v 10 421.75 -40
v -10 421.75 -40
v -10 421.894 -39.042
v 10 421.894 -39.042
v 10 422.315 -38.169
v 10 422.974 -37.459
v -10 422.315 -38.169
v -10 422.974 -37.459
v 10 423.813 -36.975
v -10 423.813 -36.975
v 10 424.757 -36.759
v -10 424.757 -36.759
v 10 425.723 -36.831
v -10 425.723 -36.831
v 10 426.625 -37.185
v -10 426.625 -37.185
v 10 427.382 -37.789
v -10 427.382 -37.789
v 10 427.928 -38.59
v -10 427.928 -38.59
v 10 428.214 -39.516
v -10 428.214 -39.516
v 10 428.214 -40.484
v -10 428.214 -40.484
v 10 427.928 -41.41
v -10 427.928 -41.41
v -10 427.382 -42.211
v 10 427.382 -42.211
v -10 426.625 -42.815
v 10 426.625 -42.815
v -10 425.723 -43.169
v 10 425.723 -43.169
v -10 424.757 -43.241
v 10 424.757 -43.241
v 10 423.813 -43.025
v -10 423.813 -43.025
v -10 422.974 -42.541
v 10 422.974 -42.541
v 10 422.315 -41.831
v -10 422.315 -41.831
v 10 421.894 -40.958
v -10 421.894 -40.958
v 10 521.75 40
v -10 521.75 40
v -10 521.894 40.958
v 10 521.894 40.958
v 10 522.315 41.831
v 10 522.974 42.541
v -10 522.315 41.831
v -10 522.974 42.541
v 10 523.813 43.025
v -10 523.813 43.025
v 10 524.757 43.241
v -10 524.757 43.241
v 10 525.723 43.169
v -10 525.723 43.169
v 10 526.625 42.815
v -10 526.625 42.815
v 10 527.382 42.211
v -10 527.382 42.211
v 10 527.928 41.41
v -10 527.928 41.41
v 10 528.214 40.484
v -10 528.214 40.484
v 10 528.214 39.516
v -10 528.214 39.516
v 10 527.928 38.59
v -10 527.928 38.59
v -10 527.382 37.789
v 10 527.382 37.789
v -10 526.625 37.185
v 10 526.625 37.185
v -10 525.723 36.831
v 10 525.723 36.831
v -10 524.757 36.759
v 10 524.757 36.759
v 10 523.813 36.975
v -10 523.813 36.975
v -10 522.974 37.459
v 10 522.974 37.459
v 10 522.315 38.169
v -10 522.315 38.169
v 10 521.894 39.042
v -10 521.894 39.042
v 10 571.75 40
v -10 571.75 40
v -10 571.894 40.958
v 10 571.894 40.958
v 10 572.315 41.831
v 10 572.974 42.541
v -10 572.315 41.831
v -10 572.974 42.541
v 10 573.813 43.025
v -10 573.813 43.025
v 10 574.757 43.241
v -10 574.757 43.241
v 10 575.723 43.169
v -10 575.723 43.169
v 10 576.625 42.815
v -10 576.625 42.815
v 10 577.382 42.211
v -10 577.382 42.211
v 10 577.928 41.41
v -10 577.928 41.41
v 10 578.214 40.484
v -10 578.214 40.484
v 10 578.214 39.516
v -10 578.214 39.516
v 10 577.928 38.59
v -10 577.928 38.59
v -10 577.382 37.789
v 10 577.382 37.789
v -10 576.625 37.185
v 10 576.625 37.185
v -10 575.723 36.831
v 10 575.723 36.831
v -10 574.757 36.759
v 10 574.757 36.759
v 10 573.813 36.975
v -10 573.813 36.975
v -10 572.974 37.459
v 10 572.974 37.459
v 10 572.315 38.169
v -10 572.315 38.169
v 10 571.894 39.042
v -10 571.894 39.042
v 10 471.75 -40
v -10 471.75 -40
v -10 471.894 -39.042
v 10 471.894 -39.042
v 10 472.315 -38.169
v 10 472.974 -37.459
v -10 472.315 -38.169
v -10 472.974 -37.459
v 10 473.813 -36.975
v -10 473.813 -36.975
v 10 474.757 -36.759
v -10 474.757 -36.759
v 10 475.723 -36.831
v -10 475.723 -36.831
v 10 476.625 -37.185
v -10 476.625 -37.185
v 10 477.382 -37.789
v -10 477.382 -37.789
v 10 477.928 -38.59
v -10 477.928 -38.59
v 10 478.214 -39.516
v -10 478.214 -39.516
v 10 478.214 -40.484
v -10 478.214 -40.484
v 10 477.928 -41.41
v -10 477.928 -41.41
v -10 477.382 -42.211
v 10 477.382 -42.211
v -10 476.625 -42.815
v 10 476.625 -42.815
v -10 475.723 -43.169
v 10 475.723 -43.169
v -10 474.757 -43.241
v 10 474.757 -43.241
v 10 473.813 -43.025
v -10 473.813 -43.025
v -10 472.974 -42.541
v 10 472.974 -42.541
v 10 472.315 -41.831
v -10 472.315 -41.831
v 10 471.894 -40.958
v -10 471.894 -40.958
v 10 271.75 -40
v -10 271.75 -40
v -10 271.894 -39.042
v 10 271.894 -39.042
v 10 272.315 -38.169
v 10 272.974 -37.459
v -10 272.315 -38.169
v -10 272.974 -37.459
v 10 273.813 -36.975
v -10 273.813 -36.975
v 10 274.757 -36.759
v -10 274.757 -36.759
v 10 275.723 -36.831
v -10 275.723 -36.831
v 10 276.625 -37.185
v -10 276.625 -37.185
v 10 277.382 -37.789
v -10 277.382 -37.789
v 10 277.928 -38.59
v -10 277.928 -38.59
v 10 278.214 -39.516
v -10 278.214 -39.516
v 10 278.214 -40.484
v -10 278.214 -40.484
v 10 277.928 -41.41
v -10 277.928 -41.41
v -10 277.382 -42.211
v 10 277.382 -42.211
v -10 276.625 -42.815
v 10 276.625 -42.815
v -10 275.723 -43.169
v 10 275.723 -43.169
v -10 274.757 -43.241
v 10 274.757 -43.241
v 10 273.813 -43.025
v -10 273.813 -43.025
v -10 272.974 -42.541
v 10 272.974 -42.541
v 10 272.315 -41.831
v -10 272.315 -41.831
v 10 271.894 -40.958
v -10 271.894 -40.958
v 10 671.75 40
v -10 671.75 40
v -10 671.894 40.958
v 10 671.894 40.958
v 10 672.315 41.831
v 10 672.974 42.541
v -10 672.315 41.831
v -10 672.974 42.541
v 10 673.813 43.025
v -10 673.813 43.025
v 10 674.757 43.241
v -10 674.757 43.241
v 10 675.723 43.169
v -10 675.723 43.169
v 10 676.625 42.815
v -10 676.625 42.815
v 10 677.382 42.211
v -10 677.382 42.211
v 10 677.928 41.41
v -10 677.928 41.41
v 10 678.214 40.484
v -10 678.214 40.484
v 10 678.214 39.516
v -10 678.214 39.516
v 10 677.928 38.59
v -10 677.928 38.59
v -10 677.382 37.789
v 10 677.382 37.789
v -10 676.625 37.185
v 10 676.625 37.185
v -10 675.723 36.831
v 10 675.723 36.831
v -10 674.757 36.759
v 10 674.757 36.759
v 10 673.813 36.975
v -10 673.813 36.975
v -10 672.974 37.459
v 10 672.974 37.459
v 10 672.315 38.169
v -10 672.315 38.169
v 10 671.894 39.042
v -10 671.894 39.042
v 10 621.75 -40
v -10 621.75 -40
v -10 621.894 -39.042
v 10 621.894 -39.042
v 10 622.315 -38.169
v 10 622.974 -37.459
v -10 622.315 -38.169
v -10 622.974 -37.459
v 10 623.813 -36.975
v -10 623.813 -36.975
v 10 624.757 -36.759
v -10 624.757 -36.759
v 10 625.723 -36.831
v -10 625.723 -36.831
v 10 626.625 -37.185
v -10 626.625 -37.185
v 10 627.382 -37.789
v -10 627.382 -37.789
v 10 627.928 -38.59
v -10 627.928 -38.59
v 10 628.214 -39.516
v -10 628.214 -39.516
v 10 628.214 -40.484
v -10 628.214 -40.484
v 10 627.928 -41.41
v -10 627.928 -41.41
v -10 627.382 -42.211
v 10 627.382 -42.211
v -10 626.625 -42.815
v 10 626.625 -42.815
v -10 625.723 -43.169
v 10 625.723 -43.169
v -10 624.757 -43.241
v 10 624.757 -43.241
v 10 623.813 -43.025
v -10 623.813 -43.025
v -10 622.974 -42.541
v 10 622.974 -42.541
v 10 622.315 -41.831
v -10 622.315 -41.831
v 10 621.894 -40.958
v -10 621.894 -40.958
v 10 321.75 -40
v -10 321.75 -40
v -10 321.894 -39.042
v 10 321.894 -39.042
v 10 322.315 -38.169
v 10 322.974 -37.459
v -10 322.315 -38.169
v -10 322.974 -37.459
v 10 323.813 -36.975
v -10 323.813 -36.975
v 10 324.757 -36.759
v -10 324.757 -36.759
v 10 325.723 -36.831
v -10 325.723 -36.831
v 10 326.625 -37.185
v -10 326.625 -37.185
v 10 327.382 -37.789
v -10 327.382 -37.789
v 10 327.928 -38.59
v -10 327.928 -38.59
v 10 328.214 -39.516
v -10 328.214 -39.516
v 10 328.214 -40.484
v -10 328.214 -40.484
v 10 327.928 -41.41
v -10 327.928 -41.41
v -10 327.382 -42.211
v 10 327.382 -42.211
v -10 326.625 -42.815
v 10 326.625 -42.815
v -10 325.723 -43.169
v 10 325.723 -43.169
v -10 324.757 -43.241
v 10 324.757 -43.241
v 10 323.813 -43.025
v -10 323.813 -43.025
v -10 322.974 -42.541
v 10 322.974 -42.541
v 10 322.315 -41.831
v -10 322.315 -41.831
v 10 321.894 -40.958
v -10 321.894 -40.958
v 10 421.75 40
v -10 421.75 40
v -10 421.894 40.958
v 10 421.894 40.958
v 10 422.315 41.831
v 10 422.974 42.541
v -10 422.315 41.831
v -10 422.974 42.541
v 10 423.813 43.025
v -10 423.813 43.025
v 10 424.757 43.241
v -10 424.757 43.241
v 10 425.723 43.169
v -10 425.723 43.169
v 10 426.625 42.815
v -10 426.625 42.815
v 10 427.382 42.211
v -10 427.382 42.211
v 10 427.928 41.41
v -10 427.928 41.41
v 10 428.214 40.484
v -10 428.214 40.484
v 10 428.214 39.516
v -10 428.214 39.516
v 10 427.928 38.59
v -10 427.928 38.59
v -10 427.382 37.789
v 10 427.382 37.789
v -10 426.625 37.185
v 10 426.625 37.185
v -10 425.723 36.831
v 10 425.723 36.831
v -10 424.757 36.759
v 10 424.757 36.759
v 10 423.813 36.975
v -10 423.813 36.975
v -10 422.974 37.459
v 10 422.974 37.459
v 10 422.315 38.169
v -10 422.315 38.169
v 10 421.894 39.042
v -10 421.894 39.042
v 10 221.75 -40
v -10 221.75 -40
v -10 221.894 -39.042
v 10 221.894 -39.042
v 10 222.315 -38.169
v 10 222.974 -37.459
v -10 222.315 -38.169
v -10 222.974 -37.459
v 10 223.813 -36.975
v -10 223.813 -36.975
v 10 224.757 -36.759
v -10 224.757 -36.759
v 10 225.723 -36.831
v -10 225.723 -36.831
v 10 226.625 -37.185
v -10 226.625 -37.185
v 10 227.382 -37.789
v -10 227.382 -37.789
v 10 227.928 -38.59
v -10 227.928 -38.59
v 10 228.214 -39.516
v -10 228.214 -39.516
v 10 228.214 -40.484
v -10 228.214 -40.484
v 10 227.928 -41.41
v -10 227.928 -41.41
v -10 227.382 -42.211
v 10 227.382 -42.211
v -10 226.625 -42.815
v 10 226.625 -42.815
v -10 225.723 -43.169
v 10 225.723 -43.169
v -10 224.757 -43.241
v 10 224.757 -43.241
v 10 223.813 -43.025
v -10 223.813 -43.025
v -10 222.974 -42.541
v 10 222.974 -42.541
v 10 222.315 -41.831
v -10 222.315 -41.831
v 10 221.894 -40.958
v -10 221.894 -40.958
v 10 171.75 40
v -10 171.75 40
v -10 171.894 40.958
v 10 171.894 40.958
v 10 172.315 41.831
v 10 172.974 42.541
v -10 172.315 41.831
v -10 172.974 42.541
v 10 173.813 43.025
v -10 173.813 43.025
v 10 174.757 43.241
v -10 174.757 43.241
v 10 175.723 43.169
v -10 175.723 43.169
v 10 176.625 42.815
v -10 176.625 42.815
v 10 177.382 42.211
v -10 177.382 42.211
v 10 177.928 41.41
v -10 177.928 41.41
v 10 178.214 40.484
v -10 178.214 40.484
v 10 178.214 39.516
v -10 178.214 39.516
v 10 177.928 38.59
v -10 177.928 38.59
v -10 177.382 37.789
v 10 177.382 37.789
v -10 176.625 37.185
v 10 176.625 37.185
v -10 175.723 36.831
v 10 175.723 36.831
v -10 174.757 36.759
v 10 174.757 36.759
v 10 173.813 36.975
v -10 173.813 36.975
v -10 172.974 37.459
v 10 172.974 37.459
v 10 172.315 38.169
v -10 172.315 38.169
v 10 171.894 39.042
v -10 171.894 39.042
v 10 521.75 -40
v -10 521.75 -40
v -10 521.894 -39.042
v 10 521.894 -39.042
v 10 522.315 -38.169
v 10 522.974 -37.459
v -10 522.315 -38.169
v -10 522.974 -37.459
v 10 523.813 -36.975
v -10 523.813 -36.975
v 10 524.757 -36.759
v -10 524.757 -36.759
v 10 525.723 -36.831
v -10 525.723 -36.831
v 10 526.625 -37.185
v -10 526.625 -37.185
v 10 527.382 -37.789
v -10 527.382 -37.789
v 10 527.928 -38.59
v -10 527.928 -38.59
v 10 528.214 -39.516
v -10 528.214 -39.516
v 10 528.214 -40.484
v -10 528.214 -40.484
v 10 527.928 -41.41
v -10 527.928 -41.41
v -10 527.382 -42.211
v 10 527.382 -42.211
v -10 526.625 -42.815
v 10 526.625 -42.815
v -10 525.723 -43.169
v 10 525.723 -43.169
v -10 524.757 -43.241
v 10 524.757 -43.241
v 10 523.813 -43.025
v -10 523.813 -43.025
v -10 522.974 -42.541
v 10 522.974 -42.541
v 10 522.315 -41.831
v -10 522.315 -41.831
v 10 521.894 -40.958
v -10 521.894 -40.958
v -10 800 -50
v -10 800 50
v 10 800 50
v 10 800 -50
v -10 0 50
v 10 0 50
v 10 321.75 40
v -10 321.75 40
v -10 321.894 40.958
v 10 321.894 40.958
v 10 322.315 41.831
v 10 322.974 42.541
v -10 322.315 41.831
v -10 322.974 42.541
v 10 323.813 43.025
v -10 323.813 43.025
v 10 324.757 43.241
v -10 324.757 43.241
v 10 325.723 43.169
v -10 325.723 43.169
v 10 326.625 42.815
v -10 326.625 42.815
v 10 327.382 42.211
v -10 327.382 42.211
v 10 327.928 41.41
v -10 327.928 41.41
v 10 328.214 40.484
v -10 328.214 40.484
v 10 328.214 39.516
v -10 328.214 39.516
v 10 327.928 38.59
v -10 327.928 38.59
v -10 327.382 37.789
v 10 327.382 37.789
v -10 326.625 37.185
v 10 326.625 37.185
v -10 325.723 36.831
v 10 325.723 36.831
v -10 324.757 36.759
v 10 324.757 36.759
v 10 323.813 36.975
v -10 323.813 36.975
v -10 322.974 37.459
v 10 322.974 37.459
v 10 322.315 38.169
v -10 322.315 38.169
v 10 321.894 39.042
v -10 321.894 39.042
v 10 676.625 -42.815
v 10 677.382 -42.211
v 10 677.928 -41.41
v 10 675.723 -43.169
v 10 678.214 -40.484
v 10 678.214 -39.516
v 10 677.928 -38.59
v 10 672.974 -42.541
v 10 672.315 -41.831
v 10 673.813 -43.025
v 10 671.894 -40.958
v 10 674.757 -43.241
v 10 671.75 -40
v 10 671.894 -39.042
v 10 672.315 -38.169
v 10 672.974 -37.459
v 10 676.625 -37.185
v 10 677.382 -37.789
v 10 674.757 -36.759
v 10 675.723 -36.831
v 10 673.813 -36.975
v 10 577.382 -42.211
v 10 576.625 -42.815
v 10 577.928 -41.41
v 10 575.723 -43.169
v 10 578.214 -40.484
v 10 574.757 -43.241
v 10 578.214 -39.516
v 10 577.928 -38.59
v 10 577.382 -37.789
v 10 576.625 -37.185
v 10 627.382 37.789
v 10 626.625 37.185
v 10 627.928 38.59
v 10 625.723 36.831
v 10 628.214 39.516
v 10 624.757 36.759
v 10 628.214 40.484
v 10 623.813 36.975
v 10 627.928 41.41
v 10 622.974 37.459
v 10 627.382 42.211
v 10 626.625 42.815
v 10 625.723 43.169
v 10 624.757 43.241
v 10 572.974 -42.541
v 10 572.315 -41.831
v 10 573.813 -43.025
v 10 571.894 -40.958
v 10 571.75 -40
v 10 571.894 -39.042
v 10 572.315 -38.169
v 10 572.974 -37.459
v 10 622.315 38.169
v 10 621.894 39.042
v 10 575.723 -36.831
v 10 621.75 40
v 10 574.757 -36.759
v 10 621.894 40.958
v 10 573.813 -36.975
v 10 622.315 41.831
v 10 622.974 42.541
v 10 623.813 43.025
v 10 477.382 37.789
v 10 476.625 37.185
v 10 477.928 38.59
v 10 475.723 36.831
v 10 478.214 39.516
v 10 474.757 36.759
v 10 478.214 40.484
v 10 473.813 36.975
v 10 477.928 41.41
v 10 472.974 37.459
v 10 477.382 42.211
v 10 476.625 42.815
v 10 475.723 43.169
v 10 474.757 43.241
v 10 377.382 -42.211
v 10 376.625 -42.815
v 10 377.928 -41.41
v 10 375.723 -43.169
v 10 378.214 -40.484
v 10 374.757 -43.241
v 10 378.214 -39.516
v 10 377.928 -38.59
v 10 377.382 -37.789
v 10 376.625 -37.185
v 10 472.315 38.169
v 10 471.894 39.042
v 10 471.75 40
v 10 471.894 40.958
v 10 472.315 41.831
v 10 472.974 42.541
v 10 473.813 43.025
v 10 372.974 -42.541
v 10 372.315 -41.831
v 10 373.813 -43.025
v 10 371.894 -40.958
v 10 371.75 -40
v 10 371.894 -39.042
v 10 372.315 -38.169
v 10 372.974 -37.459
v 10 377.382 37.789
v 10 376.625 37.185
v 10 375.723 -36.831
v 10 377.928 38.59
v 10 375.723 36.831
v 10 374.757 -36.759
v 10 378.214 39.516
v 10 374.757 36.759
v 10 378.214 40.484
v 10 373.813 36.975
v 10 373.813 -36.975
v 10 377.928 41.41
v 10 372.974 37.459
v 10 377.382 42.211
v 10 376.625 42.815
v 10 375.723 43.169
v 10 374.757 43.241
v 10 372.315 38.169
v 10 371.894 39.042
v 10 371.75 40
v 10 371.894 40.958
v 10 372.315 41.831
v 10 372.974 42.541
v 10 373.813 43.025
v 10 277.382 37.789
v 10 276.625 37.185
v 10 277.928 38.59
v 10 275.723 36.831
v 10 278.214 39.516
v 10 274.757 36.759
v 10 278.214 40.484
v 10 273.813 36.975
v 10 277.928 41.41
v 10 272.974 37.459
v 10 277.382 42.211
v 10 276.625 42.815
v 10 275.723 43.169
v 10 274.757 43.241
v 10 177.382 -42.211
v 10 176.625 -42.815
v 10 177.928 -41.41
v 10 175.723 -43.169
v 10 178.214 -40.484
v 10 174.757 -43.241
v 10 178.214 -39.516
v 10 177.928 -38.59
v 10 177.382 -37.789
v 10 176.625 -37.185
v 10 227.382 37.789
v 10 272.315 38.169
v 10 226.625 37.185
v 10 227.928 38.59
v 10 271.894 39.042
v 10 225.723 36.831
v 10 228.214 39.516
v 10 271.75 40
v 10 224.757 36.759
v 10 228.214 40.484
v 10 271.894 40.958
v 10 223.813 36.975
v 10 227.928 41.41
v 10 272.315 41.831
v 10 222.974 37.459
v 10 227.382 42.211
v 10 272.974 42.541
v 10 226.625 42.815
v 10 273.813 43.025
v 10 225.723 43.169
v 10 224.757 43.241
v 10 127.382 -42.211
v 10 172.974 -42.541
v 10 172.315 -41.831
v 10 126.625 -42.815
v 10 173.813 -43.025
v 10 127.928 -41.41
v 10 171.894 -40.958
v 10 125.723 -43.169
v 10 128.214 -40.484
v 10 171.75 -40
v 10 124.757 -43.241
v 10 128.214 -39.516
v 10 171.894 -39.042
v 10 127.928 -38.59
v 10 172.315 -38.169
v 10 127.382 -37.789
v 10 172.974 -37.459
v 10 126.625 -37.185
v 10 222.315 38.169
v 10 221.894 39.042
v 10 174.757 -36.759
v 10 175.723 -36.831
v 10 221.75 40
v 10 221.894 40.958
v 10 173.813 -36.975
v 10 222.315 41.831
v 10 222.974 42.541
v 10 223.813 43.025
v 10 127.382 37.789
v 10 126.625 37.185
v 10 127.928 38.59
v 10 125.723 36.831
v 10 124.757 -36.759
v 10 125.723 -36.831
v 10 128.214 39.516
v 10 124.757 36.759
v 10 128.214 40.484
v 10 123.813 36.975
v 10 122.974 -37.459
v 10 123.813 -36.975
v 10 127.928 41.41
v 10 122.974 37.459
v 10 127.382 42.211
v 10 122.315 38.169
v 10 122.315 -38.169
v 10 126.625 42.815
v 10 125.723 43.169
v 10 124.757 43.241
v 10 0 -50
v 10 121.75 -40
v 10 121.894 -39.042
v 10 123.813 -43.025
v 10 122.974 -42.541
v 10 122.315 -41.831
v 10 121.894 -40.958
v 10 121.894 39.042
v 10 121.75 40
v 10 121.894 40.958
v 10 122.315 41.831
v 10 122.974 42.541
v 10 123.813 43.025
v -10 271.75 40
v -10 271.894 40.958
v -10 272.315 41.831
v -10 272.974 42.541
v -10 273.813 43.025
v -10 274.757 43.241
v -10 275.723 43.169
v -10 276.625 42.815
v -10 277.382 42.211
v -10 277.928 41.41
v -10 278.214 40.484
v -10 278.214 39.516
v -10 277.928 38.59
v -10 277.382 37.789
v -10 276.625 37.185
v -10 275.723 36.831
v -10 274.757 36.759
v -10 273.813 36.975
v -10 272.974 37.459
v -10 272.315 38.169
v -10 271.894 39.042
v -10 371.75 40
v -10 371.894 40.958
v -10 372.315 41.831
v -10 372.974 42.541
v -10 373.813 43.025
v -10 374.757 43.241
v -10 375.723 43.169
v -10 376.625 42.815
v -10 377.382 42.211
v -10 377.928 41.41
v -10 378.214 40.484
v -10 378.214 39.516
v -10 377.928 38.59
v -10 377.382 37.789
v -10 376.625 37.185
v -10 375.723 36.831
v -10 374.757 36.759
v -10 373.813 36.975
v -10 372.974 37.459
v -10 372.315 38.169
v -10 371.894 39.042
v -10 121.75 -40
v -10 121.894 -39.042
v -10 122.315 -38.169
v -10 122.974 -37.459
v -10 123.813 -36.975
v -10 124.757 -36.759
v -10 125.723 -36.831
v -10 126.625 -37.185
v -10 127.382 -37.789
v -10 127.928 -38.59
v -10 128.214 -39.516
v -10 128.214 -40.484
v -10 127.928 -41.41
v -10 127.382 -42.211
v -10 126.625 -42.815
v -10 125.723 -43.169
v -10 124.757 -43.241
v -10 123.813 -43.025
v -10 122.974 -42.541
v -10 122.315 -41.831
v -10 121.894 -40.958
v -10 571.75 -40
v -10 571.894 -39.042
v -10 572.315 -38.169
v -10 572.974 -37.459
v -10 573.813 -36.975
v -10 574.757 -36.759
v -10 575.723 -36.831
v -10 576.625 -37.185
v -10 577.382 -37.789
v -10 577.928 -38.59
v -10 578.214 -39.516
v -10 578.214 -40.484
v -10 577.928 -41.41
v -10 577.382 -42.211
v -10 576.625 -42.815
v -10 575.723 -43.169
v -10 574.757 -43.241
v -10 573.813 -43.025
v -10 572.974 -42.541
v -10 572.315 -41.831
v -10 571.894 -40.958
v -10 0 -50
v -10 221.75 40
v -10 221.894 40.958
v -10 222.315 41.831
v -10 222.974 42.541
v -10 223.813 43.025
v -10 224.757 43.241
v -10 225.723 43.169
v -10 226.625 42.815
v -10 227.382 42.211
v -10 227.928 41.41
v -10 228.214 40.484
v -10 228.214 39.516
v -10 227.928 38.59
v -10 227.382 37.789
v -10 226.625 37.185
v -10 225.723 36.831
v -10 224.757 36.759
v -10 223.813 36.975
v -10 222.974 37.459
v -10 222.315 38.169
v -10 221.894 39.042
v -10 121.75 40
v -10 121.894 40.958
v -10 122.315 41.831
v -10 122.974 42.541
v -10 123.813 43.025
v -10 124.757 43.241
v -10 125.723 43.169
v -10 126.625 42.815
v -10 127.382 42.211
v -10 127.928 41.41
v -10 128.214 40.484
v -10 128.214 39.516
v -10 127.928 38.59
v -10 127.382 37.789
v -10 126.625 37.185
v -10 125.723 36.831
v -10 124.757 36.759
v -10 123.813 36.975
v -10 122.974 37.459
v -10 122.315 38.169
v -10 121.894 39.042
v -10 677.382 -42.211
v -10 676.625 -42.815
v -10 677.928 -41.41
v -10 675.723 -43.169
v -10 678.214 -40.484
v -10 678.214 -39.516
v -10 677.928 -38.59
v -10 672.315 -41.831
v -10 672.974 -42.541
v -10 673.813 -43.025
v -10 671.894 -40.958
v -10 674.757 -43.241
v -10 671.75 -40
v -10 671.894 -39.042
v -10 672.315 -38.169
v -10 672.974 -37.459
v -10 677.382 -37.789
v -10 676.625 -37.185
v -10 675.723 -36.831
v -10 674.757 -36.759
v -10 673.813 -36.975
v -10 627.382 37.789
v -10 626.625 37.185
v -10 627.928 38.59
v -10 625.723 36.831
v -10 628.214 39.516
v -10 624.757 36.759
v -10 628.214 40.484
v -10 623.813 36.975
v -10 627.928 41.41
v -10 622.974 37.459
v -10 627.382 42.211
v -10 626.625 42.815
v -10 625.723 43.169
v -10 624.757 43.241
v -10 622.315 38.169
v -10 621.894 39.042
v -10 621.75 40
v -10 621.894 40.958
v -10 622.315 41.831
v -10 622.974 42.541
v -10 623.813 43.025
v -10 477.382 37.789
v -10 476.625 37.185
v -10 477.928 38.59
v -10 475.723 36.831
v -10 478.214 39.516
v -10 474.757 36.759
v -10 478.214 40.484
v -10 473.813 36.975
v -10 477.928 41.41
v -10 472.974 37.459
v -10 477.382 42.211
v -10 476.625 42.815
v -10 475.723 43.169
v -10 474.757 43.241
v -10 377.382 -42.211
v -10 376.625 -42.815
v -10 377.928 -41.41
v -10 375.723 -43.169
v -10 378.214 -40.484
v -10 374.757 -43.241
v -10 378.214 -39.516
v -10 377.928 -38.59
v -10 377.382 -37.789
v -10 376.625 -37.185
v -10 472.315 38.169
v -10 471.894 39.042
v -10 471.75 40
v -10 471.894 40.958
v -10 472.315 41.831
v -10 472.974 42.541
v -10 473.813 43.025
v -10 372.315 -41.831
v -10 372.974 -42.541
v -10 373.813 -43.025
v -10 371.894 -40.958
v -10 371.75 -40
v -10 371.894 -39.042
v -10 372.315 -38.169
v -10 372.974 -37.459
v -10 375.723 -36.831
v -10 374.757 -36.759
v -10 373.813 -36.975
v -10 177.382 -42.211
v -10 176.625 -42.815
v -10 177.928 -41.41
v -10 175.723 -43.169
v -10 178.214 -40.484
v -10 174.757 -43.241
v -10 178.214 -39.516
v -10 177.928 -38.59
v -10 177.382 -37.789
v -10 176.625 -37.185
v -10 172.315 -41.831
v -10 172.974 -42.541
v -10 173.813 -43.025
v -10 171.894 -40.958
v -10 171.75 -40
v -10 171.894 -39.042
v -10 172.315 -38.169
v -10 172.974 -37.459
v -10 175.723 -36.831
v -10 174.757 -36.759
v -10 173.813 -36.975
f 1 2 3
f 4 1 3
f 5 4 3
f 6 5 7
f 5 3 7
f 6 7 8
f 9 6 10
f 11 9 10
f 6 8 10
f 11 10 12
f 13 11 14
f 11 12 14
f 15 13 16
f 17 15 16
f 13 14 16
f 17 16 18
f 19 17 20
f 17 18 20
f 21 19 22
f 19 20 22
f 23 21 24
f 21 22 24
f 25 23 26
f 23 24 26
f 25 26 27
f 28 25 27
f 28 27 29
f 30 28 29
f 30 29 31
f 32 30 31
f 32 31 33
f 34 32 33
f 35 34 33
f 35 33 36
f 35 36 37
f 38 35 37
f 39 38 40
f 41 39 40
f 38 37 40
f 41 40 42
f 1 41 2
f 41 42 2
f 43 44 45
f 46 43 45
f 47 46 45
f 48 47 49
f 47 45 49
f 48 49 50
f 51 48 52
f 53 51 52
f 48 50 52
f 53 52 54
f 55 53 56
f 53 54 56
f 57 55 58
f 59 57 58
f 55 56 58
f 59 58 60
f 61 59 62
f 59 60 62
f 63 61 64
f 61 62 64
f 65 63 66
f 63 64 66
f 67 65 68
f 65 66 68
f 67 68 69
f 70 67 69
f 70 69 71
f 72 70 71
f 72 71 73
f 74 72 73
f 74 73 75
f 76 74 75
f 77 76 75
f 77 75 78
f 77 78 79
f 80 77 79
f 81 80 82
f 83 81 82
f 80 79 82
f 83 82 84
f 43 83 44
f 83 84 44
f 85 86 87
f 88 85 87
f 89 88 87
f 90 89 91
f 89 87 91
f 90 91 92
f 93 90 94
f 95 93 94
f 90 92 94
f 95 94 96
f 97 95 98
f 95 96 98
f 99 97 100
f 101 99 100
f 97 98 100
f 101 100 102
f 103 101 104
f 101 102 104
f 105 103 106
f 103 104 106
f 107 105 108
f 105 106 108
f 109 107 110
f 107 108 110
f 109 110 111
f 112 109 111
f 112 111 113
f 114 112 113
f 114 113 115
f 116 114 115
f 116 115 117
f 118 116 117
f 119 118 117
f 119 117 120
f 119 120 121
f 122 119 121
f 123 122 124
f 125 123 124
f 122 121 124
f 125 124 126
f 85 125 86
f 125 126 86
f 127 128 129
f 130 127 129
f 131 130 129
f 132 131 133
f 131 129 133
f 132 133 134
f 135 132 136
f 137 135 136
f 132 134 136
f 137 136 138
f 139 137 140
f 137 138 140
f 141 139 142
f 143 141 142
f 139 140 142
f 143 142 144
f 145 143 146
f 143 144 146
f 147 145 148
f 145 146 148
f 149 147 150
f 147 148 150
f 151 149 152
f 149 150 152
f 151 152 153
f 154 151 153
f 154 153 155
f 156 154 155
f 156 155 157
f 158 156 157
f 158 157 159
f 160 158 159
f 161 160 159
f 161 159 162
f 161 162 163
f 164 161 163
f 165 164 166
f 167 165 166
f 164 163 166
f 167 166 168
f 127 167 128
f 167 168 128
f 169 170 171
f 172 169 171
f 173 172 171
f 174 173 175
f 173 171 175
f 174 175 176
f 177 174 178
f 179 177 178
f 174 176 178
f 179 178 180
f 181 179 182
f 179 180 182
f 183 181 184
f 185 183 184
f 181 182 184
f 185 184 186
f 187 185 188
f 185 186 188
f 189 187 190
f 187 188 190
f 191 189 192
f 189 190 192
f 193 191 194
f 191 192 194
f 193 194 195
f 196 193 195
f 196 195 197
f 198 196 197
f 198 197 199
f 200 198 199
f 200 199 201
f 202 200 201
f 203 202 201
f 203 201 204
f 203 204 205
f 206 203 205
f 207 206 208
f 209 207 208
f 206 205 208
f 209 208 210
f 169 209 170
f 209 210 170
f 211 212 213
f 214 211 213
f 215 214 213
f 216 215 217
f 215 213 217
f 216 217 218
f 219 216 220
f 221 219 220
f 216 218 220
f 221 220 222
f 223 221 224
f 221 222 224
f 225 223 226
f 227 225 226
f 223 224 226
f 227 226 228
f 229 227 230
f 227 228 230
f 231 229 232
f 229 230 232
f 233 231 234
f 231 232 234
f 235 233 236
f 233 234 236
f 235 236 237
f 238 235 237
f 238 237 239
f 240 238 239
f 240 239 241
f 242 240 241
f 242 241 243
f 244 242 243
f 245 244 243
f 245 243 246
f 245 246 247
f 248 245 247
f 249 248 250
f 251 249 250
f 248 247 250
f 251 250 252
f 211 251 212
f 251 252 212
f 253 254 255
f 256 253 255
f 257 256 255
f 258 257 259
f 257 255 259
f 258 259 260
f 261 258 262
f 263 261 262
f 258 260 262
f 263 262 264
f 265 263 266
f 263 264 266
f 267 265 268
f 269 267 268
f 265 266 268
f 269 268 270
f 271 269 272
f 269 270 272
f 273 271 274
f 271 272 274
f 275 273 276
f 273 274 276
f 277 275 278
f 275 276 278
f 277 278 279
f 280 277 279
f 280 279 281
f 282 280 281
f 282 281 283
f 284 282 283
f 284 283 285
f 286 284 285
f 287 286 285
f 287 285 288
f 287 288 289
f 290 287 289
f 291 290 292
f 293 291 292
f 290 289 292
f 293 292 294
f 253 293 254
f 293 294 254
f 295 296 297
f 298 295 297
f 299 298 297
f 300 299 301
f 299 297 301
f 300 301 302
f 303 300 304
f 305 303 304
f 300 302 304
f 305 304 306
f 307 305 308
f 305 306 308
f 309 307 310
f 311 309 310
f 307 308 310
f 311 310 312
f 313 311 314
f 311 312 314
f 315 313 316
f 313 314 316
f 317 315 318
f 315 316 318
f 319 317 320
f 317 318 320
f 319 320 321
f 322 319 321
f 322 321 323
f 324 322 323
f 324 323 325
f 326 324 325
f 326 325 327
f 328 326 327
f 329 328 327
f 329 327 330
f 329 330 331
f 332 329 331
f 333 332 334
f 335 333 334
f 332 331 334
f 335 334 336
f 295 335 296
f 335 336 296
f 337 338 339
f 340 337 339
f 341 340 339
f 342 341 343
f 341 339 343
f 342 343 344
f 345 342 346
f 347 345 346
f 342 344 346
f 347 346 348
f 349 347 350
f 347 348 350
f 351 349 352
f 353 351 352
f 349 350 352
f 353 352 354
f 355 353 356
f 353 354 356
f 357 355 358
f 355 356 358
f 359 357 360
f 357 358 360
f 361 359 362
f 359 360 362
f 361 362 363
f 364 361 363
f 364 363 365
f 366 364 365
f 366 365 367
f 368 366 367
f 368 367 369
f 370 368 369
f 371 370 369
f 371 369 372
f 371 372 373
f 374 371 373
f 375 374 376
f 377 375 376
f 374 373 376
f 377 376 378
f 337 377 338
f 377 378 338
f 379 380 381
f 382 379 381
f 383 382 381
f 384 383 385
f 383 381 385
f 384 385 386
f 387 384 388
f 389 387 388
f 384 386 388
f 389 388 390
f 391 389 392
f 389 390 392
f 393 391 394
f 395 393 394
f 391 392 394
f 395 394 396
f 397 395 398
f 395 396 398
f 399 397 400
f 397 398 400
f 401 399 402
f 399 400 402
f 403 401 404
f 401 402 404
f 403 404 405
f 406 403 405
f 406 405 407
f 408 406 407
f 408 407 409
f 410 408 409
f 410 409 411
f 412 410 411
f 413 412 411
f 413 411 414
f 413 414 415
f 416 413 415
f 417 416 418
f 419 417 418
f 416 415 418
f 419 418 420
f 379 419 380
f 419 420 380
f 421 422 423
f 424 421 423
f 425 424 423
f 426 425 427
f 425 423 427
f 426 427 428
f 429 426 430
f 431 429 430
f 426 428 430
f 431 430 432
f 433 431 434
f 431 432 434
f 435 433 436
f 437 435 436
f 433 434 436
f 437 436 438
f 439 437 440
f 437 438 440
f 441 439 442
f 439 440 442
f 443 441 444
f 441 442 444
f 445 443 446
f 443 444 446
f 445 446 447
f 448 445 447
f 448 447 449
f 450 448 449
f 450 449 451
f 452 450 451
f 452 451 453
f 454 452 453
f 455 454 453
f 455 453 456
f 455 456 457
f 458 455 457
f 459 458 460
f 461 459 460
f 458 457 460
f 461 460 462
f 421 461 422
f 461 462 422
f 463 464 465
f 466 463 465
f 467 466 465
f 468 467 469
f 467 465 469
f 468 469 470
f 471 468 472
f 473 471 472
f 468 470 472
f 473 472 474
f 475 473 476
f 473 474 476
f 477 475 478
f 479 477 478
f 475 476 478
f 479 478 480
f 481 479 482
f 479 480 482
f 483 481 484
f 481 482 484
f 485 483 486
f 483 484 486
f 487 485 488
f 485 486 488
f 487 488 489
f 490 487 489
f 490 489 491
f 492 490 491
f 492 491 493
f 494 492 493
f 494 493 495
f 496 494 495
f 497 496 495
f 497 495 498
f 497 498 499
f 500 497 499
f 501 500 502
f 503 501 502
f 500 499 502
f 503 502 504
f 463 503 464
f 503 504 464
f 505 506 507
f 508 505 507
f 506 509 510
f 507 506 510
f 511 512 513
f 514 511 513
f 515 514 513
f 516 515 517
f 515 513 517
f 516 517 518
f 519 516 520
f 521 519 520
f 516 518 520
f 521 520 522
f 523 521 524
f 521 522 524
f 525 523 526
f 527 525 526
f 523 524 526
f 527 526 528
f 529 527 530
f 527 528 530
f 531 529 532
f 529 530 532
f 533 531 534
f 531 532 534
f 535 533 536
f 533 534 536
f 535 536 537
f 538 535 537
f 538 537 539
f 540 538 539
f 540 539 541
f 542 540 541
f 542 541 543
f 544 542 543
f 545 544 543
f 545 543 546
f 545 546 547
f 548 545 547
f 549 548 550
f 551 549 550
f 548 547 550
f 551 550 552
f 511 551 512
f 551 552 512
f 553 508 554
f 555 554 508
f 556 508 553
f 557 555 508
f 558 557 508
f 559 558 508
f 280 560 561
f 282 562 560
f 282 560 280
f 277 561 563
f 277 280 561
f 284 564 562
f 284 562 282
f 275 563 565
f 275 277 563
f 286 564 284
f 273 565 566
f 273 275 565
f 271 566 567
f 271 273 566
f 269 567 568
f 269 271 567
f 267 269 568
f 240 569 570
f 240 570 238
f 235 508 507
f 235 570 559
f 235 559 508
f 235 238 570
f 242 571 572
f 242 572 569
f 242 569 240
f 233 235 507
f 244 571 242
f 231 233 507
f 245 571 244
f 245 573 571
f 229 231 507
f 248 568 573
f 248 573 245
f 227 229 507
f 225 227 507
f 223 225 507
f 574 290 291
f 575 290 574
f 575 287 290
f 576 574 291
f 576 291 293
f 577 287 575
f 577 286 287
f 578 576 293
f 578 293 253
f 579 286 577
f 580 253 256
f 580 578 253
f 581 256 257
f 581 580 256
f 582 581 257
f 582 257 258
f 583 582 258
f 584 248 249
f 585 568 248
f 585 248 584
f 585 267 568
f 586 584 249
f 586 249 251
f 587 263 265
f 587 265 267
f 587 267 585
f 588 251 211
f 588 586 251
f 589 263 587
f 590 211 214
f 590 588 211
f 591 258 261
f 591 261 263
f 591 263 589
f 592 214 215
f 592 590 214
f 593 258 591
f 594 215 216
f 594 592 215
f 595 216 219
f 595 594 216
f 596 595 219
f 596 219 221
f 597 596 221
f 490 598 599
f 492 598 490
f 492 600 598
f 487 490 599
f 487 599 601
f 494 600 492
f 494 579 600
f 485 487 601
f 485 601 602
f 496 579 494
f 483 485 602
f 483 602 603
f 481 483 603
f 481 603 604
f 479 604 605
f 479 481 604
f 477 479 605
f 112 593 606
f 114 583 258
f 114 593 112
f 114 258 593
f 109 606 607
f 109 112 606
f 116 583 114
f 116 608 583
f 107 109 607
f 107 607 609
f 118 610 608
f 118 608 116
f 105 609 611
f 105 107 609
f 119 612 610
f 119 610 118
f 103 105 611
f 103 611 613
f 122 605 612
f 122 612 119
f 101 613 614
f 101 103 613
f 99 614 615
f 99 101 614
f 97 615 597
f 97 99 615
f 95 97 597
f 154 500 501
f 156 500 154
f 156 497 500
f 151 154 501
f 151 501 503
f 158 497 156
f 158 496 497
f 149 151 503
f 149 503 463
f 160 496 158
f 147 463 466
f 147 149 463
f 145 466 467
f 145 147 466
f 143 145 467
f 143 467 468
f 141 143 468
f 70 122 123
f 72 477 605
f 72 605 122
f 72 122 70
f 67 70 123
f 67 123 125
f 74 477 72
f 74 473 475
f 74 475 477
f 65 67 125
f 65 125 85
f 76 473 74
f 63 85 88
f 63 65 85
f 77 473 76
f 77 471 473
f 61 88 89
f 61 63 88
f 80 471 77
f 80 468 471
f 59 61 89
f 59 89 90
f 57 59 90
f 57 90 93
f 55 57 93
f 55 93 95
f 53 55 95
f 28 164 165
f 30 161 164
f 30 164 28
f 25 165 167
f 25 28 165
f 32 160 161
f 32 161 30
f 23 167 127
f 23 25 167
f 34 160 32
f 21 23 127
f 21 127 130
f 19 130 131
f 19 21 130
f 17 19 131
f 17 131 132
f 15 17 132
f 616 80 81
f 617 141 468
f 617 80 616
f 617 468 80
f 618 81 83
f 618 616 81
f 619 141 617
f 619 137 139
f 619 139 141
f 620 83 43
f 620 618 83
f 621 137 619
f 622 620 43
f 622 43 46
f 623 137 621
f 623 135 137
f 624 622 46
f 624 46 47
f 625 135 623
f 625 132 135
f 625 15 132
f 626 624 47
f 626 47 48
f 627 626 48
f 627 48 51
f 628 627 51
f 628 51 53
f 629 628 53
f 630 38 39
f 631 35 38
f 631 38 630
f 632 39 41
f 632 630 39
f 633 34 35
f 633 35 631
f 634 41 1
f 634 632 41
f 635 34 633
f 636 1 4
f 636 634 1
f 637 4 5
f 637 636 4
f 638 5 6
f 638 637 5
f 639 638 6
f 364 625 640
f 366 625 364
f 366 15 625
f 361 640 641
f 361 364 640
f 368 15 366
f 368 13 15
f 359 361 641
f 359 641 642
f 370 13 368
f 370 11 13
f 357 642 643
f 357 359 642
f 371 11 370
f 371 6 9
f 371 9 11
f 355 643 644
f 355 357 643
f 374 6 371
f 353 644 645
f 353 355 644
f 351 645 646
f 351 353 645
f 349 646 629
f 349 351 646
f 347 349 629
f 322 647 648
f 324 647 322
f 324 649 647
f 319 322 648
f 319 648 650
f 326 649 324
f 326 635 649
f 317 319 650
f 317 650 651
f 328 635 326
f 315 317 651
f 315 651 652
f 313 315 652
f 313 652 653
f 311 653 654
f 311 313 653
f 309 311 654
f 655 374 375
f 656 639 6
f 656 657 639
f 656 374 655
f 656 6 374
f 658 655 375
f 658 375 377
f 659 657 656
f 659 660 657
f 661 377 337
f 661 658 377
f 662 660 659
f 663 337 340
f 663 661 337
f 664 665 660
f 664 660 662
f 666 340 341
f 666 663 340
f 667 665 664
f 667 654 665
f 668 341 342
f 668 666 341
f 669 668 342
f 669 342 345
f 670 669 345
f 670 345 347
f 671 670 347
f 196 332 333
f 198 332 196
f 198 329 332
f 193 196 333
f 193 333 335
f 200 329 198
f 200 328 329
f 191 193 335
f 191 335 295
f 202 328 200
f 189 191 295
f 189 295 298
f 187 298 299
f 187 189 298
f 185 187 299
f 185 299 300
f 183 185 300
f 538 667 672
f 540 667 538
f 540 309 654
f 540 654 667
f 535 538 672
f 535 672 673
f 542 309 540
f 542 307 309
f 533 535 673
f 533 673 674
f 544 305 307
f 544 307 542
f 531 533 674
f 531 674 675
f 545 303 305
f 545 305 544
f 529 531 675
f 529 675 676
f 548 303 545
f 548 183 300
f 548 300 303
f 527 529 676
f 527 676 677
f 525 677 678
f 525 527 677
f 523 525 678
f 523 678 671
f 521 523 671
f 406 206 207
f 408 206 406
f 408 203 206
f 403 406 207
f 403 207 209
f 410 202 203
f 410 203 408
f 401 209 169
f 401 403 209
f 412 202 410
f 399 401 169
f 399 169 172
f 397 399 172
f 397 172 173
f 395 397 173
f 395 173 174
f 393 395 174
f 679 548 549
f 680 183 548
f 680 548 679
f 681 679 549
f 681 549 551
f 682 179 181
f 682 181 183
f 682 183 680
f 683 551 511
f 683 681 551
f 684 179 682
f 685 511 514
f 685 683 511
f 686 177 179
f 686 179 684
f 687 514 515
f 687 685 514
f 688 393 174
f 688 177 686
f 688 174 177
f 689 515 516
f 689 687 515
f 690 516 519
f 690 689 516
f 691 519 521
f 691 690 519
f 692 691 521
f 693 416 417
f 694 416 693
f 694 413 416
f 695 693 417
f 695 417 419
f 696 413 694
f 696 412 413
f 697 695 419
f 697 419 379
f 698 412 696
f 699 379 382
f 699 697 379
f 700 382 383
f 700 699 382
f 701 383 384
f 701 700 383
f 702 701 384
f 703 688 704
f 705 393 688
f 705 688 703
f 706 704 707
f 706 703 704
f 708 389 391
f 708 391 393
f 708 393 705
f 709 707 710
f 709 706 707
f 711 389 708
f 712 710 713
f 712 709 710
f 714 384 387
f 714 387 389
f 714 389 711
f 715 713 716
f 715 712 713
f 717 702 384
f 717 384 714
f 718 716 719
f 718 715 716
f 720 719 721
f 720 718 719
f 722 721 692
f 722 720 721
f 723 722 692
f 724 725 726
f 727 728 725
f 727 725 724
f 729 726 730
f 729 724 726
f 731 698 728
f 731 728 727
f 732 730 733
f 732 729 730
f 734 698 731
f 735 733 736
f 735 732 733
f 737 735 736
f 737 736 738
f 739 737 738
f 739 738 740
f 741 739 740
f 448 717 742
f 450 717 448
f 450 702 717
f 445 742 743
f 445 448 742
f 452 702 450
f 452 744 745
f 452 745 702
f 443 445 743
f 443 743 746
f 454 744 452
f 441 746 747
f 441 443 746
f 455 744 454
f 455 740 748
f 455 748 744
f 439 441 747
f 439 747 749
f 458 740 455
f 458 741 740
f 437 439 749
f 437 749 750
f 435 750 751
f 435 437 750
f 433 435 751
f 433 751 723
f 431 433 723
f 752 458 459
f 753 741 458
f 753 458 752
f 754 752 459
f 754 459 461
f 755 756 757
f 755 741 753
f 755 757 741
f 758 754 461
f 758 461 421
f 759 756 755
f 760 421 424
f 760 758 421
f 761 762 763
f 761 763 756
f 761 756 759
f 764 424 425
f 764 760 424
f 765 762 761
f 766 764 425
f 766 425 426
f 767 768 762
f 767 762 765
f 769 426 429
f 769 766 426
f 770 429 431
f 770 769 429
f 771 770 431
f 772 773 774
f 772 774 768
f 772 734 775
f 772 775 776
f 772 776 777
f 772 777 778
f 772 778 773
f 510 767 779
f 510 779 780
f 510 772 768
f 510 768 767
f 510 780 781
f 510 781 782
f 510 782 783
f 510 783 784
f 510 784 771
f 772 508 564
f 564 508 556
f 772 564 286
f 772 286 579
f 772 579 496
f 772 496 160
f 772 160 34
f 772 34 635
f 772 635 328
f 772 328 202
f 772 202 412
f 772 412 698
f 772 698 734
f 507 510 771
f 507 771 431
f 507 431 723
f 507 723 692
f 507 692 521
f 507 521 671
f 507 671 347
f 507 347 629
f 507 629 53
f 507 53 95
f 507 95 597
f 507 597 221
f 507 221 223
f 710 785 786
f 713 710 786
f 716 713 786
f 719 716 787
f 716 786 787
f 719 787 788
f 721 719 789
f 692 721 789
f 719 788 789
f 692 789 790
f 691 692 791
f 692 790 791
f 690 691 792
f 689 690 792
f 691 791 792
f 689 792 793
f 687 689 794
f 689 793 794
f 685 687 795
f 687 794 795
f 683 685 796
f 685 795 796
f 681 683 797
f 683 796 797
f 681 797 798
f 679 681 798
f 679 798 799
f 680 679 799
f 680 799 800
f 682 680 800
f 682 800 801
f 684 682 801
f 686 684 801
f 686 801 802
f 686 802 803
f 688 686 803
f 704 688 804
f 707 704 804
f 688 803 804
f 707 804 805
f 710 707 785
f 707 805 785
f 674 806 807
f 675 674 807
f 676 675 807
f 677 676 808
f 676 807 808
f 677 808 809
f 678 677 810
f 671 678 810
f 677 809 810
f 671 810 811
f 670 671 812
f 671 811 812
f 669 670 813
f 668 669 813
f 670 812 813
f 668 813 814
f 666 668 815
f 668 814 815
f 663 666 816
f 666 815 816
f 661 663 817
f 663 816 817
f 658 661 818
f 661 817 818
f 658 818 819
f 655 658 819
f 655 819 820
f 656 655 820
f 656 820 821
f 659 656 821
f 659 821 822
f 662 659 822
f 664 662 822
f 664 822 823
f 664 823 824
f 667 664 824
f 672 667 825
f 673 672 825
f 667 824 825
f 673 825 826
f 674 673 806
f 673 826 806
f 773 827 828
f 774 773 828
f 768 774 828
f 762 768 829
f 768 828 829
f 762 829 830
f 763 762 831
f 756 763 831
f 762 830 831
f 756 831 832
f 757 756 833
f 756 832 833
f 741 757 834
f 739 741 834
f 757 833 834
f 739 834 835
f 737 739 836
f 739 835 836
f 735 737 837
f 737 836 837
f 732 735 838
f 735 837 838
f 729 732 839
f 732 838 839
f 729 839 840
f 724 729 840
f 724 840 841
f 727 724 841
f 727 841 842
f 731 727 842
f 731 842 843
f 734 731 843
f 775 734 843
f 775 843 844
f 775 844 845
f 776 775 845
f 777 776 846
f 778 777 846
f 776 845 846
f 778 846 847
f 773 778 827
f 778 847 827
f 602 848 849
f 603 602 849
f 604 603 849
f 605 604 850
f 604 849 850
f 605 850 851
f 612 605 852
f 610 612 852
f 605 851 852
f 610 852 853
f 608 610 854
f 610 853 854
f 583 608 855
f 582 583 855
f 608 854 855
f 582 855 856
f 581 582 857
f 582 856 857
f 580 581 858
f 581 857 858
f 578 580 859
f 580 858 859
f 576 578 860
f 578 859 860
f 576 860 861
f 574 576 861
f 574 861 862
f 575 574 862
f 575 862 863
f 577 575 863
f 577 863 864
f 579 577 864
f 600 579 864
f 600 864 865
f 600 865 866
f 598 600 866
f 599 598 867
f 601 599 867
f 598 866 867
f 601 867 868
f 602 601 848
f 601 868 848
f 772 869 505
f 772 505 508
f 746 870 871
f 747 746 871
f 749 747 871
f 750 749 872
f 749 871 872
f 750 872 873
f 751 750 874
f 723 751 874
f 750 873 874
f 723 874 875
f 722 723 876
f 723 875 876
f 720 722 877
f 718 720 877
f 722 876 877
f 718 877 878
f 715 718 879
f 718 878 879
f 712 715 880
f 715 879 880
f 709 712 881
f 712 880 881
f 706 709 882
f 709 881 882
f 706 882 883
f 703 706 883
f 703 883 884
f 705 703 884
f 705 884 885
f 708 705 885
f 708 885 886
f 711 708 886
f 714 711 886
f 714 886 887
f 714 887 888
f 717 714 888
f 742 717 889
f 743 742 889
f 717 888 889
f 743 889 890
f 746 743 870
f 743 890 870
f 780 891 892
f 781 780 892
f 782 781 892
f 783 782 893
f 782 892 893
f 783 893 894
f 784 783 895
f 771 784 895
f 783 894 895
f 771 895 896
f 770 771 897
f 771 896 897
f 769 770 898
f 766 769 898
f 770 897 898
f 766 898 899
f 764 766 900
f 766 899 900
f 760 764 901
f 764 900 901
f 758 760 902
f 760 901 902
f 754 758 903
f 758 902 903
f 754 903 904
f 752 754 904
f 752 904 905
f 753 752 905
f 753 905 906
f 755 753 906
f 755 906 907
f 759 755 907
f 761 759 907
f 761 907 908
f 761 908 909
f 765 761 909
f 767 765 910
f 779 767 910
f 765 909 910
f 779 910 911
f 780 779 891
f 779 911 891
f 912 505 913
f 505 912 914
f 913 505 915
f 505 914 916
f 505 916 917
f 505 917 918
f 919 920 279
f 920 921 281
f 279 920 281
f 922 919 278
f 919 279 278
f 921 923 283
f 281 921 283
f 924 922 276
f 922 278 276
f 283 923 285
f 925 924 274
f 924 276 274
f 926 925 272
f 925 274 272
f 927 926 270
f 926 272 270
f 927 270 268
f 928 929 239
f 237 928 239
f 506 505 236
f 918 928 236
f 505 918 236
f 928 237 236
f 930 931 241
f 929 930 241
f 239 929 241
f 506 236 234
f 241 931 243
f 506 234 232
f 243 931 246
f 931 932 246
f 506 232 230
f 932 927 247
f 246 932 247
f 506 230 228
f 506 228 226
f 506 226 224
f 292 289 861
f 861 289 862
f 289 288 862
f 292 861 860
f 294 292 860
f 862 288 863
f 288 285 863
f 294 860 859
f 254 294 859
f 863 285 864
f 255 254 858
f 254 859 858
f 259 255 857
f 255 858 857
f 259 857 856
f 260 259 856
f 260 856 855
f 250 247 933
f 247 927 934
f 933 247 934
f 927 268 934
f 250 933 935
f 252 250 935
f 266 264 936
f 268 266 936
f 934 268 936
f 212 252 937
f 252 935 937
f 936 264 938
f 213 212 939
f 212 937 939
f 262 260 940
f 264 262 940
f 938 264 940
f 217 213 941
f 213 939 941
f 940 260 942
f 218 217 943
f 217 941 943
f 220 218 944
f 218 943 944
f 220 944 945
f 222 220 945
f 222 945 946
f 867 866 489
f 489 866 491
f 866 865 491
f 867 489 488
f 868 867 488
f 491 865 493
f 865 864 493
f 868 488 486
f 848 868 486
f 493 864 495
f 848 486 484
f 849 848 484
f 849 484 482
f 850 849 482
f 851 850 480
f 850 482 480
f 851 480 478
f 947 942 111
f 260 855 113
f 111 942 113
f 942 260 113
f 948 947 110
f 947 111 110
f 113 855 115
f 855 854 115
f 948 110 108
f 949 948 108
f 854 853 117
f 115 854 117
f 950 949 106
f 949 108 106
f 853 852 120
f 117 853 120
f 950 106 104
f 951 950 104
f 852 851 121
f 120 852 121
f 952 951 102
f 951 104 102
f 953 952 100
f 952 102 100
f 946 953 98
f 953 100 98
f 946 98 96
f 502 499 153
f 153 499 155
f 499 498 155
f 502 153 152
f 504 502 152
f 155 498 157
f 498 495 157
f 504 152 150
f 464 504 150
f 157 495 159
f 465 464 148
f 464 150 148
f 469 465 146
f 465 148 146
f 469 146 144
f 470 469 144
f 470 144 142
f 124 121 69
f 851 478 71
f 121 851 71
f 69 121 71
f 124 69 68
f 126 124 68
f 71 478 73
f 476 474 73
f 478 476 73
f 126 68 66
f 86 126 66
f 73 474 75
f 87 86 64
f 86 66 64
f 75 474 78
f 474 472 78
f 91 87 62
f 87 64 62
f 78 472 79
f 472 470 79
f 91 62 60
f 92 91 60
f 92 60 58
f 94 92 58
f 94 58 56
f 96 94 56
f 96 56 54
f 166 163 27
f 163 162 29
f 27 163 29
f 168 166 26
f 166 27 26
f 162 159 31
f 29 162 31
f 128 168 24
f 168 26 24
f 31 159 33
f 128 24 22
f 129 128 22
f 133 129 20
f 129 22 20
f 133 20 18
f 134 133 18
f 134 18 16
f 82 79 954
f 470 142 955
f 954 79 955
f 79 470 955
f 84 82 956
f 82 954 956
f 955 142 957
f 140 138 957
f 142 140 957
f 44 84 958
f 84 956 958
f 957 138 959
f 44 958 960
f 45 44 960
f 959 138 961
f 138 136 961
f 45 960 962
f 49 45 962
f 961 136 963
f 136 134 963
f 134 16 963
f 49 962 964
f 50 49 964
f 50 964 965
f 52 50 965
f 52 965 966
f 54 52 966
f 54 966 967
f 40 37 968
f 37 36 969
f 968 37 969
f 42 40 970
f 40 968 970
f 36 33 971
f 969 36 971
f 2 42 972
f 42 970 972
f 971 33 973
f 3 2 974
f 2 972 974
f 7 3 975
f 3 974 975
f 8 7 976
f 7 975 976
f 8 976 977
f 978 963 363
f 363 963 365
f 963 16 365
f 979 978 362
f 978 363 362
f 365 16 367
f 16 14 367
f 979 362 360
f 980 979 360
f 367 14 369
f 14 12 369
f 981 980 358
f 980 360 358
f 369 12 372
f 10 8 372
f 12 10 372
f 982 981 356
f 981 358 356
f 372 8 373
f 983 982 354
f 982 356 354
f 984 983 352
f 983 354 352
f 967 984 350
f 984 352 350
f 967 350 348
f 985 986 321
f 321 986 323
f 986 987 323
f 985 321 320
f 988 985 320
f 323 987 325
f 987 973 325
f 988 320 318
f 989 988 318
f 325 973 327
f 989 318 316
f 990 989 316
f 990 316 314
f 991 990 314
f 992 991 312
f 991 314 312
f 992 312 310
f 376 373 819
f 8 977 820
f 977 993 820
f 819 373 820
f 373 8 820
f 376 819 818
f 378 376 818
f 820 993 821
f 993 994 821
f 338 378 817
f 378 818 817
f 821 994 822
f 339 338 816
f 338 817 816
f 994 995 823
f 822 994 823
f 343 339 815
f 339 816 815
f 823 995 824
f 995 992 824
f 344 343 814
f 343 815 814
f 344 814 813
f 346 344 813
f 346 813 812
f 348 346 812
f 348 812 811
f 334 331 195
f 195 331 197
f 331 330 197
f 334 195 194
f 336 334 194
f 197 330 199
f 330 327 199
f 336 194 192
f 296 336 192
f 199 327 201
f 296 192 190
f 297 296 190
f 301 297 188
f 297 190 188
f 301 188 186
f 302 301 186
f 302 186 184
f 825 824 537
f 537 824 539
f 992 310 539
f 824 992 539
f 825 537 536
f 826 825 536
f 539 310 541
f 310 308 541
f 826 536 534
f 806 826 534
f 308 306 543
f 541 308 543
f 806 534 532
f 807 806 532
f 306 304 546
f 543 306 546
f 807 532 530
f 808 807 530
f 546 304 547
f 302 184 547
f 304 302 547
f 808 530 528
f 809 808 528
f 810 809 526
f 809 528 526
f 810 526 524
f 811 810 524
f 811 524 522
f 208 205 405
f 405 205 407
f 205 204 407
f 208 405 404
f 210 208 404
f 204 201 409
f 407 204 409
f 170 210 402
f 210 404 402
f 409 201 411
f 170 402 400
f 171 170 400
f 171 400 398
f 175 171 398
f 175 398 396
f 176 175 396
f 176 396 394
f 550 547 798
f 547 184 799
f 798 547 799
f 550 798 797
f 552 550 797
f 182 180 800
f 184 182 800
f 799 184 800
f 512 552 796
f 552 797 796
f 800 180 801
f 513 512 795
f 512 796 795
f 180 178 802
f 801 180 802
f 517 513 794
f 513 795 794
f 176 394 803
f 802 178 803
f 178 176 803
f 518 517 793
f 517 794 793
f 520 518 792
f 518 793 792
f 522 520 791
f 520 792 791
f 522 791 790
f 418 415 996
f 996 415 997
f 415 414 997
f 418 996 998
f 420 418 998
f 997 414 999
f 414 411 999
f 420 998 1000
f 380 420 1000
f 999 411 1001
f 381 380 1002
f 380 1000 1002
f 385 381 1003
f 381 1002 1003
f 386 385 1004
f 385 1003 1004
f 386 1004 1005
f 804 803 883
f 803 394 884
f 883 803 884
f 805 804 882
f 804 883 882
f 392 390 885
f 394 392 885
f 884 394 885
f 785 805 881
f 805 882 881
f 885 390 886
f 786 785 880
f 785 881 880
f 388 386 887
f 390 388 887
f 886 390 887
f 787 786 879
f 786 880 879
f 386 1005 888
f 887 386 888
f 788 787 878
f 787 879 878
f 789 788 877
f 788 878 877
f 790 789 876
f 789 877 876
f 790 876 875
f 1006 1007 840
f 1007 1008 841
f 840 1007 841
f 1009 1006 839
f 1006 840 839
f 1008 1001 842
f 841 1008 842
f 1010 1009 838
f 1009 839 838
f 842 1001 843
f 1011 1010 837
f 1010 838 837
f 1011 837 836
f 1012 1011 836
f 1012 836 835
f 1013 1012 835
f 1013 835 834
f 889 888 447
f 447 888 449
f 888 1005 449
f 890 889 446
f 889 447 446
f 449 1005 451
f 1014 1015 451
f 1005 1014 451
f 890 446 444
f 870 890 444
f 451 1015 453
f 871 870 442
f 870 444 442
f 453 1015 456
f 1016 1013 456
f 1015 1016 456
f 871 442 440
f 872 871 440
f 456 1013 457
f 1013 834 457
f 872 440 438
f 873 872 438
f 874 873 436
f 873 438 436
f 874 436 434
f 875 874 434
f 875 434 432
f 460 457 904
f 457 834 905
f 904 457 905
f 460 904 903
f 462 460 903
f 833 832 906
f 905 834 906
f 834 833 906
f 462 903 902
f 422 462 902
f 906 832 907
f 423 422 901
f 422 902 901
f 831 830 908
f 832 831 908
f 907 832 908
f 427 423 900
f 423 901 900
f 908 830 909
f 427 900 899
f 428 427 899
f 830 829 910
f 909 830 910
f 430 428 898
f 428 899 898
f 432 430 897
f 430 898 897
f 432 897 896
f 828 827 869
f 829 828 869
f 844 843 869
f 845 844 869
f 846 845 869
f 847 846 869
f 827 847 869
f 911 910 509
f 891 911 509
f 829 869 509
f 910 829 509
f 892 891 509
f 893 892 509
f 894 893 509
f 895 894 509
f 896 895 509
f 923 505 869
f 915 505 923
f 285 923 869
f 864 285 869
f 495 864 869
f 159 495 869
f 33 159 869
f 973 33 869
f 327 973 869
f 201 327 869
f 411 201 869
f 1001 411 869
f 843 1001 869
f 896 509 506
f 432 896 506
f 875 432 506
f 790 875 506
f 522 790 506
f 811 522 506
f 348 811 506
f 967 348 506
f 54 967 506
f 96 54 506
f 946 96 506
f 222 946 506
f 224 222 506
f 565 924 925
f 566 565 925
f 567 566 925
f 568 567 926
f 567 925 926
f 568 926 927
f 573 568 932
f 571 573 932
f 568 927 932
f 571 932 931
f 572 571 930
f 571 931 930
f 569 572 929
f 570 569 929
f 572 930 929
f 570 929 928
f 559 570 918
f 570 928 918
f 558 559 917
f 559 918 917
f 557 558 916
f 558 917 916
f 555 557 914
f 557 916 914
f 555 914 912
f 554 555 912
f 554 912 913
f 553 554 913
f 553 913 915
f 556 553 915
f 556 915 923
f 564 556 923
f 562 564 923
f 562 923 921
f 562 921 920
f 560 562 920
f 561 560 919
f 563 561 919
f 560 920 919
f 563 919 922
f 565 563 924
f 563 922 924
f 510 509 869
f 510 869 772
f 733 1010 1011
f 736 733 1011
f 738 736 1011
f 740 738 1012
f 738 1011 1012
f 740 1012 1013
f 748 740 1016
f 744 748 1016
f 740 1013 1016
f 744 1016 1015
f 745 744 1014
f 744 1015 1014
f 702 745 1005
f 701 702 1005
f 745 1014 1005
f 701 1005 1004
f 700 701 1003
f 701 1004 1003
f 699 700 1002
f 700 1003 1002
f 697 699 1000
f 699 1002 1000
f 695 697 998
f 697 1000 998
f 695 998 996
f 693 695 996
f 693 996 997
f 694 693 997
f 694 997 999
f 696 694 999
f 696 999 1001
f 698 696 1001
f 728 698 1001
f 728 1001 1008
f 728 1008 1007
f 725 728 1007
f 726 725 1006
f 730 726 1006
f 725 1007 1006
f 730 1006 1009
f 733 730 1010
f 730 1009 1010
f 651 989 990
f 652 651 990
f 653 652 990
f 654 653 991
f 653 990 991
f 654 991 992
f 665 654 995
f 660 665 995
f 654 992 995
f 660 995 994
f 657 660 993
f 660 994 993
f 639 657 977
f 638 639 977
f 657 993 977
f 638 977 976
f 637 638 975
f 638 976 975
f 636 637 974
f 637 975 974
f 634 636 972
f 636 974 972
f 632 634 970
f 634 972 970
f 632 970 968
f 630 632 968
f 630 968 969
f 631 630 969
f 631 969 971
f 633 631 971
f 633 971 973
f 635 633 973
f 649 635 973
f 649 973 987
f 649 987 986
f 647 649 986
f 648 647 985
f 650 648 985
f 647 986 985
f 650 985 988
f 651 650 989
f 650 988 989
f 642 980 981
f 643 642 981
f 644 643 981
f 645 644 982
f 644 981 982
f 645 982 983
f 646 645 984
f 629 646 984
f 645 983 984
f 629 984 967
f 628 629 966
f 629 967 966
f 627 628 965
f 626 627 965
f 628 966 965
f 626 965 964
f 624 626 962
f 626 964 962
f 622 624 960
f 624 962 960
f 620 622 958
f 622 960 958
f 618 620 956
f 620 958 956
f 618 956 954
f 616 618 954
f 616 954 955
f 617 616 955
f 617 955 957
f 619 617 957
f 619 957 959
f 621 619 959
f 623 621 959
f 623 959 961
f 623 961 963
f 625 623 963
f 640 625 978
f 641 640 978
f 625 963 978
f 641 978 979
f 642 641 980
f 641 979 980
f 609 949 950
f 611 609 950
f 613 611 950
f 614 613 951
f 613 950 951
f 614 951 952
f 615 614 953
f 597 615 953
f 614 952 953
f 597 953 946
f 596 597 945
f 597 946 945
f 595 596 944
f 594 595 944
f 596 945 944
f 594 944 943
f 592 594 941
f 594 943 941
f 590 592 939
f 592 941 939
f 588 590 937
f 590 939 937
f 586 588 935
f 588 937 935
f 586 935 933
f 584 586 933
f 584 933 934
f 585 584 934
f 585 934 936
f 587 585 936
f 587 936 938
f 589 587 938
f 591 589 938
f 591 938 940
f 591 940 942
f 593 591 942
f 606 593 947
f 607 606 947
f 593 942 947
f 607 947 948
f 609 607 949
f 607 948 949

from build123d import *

# Parameters (mm, degrees)
F0_W     = 20
F0_H     = 100
F1_DEPTH = 800
F2_R     = 3.25
F3_DEPTH = 20


# Not quite as in the source:
# - a feature names something its author has since deleted; it is built from what else it names


with BuildPart() as f1:
    # F0 (on Front) → F1 (new body)
    with BuildSketch(Plane.XZ):
        Rectangle(F0_W, F0_H)
    extrude(amount=-F1_DEPTH)

    # F2 (on face) → F3 (cut, through all)
    with BuildSketch(Plane(origin=(-10, 0, 0), x_dir=(0, -1, 0), z_dir=(-1, 0, 0))):
        with Locations((-625, 40)):
            Circle(F2_R)
        with Locations((-575, 40)):
            Circle(F2_R)
        with Locations((-675, 40)):
            Circle(F2_R)
        with Locations((-675, -40)):
            Circle(F2_R)
        with Locations((-625, -40)):
            Circle(F2_R)
        with Locations((-525, -40)):
            Circle(F2_R)
        with Locations((-575, -40)):
            Circle(F2_R)
        with Locations((-525, 40)):
            Circle(F2_R)
        with Locations((-475, 40)):
            Circle(F2_R)
        with Locations((-425, 40)):
            Circle(F2_R)
        with Locations((-375, 40)):
            Circle(F2_R)
        with Locations((-325, 40)):
            Circle(F2_R)
        with Locations((-275, 40)):
            Circle(F2_R)
        with Locations((-225, 40)):
            Circle(F2_R)
        with Locations((-175, 40)):
            Circle(F2_R)
        with Locations((-175, -40)):
            Circle(F2_R)
        with Locations((-225, -40)):
            Circle(F2_R)
        with Locations((-325, -40)):
            Circle(F2_R)
        with Locations((-375, -40)):
            Circle(F2_R)
        with Locations((-425, -40)):
            Circle(F2_R)
        with Locations((-475, -40)):
            Circle(F2_R)
        with Locations((-275, -40)):
            Circle(F2_R)
        with Locations((-125, -40)):
            Circle(F2_R)
        with Locations((-125, 40)):
            Circle(F2_R)
    extrude(amount=-F3_DEPTH, mode=Mode.SUBTRACT)


solid = f1.part
